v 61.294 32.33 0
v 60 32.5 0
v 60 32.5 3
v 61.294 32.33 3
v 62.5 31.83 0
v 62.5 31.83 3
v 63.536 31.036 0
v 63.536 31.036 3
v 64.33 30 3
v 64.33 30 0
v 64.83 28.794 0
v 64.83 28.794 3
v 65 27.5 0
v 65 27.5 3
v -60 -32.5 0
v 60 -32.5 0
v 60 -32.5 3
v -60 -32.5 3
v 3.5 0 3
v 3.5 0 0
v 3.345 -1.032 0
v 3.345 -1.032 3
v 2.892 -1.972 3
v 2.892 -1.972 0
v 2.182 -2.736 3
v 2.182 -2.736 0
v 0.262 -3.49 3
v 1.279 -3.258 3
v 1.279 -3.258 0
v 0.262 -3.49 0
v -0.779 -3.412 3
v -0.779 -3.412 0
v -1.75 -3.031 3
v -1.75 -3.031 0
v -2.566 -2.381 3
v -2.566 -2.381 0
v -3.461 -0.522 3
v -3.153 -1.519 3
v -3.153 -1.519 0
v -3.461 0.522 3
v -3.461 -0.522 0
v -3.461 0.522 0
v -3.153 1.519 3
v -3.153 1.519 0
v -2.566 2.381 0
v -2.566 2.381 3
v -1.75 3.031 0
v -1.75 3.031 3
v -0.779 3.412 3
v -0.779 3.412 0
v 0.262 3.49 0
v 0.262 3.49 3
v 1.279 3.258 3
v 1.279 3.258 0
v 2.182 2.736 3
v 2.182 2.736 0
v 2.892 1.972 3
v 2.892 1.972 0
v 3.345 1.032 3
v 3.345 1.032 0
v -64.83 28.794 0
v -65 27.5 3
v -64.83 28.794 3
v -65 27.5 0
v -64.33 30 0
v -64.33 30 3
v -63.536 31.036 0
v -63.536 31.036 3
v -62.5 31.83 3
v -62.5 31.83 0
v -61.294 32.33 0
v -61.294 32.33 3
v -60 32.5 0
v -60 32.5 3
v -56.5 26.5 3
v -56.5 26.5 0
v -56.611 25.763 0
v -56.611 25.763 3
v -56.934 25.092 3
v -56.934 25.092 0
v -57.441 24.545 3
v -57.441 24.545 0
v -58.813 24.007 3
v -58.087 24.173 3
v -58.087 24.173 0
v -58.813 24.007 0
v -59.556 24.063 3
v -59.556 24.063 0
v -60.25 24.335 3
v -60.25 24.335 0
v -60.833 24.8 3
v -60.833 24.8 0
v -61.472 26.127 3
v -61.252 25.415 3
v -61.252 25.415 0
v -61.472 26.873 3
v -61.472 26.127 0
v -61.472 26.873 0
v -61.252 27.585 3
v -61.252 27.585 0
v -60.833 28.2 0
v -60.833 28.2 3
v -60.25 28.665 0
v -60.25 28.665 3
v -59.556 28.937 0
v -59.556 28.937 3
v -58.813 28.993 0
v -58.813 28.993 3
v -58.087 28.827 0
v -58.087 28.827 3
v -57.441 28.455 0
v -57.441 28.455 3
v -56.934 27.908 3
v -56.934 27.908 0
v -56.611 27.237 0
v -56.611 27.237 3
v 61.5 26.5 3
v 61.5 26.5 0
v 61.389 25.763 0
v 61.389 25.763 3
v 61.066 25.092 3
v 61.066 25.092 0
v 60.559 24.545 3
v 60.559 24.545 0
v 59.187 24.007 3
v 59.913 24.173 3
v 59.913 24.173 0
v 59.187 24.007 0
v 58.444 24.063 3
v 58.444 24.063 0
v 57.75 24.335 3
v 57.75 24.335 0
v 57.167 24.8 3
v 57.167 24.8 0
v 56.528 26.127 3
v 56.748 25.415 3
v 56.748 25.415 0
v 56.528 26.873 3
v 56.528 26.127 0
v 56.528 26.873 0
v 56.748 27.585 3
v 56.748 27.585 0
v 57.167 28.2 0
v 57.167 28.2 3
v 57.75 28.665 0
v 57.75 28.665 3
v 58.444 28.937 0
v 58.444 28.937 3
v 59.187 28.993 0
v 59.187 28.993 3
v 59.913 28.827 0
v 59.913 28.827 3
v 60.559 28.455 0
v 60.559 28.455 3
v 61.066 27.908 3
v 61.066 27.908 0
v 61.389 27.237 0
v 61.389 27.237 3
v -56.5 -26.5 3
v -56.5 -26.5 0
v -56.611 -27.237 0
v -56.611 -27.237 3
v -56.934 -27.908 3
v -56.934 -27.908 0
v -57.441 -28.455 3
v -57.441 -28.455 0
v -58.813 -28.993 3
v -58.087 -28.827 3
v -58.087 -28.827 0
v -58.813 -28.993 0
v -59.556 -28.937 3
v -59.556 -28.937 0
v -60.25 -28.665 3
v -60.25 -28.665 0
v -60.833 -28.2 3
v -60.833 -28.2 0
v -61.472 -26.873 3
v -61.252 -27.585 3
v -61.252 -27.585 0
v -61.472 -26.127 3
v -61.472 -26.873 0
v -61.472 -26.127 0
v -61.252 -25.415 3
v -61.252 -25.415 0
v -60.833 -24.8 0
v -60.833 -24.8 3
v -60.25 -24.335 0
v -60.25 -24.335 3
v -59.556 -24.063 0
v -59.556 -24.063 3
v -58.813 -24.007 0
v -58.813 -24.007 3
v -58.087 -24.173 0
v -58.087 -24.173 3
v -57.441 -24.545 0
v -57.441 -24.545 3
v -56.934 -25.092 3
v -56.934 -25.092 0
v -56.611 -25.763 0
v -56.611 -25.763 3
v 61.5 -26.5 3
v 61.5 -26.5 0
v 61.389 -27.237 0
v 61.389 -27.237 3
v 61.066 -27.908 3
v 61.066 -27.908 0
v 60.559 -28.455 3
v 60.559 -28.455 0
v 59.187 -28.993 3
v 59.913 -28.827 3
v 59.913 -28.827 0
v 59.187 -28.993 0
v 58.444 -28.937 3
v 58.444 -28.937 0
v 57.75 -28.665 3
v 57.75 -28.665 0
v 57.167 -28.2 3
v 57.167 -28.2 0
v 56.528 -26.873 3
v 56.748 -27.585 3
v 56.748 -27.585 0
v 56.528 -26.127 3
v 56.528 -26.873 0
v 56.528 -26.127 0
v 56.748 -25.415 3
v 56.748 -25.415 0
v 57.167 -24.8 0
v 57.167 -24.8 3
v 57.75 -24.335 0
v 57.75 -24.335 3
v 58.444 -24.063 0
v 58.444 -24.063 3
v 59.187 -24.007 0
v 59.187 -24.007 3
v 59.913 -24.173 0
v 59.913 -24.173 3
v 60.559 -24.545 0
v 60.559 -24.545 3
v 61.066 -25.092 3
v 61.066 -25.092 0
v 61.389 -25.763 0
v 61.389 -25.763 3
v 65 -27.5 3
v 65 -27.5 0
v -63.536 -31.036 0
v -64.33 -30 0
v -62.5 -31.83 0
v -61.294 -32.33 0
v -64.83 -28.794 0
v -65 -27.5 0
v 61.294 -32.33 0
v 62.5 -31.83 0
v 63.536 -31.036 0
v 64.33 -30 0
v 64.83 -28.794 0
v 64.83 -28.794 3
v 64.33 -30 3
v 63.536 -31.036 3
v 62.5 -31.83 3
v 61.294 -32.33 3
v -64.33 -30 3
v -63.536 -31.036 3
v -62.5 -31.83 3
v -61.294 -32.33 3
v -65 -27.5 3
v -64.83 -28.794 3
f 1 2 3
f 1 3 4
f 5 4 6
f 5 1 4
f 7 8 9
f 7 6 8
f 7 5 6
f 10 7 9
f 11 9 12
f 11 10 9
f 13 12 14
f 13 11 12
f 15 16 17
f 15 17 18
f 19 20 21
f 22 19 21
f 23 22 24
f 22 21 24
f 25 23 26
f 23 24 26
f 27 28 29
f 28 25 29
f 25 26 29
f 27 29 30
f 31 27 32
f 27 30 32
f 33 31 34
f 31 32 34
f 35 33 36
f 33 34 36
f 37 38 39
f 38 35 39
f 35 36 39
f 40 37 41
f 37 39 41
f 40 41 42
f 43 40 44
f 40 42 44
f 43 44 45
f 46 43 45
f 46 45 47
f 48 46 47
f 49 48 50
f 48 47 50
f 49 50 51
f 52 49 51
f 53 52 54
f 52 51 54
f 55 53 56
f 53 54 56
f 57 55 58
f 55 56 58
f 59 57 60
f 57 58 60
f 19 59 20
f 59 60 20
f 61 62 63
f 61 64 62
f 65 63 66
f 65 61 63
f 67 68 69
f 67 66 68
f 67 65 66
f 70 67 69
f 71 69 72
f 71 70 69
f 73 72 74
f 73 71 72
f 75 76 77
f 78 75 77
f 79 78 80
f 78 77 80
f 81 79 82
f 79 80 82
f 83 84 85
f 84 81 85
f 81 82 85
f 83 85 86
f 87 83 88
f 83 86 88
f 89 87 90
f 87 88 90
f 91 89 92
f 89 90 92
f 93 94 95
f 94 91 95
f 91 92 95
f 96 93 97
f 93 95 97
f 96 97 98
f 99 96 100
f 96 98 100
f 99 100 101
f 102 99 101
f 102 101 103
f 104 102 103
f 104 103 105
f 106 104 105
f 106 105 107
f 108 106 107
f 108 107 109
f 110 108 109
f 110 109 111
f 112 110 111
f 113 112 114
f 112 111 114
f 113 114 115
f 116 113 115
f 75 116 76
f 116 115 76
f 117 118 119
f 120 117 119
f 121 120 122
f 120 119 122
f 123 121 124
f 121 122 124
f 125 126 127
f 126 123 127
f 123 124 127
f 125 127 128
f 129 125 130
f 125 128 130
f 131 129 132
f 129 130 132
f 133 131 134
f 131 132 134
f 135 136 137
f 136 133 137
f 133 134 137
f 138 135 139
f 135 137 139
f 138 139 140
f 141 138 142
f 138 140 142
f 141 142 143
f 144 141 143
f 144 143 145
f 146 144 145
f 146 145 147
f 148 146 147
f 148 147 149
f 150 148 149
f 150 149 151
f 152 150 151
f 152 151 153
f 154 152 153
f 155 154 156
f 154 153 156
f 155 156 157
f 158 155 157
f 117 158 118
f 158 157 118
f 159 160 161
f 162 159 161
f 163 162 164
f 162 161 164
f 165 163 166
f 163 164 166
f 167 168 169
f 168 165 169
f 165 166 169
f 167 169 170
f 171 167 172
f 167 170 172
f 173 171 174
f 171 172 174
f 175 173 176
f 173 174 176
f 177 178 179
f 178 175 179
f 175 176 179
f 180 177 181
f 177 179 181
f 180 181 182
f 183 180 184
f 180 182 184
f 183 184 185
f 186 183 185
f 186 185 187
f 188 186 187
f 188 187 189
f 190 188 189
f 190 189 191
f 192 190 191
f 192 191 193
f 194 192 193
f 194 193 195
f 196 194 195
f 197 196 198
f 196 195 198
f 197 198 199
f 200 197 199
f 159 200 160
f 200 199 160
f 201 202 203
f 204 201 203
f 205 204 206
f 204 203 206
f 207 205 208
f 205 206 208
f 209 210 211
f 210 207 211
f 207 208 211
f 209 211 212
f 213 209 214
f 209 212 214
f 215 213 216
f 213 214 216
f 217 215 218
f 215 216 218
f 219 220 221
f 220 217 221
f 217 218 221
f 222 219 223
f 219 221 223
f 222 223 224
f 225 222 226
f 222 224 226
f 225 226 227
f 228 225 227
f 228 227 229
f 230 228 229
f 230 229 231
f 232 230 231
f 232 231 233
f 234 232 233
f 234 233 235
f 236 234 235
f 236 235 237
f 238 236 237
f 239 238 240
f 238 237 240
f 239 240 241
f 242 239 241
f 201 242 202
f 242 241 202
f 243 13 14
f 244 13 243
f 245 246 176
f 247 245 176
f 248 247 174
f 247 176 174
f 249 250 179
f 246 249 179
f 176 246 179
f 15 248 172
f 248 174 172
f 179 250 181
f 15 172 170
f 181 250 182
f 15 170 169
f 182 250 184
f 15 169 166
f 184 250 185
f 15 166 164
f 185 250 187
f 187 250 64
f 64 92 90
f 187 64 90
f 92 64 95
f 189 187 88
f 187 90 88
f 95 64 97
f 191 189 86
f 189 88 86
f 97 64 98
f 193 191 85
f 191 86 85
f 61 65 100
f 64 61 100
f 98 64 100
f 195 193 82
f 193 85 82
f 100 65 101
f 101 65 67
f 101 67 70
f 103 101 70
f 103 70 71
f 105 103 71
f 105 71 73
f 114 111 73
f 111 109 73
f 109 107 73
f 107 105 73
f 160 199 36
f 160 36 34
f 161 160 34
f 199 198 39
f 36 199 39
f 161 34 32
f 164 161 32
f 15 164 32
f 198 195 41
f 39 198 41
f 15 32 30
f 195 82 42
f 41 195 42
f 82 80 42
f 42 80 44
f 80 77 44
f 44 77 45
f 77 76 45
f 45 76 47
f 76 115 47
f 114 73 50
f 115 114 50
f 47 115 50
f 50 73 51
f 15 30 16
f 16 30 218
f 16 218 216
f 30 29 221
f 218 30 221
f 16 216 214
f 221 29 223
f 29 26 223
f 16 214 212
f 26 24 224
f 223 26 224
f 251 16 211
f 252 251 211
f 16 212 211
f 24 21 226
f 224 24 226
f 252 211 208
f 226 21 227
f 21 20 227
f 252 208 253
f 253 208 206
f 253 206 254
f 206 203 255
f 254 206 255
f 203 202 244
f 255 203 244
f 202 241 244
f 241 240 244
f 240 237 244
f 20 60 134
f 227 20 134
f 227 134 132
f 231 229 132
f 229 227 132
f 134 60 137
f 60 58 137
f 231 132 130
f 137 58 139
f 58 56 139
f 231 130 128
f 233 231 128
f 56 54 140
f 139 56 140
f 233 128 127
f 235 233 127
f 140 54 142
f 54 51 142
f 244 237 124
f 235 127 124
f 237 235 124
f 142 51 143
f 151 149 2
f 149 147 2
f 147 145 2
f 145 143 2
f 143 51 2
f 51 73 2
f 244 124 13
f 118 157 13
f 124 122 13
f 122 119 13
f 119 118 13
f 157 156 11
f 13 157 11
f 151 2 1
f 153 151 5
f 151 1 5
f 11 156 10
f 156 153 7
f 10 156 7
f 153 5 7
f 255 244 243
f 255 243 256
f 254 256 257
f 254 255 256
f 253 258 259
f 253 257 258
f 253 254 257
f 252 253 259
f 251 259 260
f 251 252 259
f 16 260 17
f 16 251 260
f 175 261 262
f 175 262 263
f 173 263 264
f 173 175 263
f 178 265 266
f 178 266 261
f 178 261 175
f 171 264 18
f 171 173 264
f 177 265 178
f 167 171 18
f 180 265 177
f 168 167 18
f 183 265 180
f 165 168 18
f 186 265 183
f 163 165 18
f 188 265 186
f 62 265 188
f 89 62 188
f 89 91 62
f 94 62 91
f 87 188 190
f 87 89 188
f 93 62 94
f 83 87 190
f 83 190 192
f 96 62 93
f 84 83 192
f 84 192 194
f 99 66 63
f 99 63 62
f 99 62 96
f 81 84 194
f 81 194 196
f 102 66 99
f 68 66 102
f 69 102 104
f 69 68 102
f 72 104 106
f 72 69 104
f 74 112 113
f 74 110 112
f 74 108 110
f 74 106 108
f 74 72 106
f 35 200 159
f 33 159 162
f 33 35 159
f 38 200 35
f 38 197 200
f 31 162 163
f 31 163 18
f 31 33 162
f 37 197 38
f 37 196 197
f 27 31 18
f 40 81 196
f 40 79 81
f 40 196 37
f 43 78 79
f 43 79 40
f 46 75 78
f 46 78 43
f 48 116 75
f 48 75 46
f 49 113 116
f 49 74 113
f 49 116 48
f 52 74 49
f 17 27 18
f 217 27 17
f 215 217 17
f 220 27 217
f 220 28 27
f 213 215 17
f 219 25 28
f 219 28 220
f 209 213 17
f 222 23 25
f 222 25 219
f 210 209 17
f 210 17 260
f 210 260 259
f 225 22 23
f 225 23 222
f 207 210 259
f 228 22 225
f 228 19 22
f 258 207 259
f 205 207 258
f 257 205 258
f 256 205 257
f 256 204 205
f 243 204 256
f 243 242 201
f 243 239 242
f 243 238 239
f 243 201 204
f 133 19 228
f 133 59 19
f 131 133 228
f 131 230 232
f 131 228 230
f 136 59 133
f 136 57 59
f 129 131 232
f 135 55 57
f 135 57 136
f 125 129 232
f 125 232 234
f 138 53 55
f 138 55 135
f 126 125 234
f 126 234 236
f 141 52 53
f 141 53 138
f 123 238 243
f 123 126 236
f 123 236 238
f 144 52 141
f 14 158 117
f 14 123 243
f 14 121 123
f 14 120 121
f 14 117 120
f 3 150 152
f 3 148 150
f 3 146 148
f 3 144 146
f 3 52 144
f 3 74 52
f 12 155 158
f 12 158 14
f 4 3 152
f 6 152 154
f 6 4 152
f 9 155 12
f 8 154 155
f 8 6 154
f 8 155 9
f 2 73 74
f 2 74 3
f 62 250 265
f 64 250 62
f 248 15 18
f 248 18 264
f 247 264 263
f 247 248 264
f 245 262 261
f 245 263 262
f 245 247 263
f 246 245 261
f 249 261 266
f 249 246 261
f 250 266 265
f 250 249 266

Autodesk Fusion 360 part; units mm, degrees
sketch "Sketch1" plane through (0, 0, 0) normal (0, 0, 1) x (1, 0, 0)
  line L0 (-60, 32.5) -> (60, 32.5)
  line L1 (65, 27.5) -> (65, -27.5)
  line L2 (60, -32.5) -> (-60, -32.5)
  line L3 (-65, -27.5) -> (-65, 27.5)
  arc A0 (-60, 32.5) -> (-65, 27.5) centre (-60, 27.5) ccw
  arc A1 (-65, -27.5) -> (-60, -32.5) centre (-60, -27.5) ccw
  arc A2 (65, 27.5) -> (60, 32.5) centre (60, 27.5) ccw
  arc A3 (60, -32.5) -> (65, -27.5) centre (60, -27.5) ccw
  circle A4 centre (-59, 26.5) radius 2.5
  circle A5 centre (-59, -26.5) radius 2.5
  circle A6 centre (59, 26.5) radius 2.5
  circle A7 centre (59, -26.5) radius 2.5
  circle A8 centre (0, 0) radius 3.5
  dimension "d1" = 65
  dimension "d2" = 65
  dimension "d3" = 32.5
  dimension "d4" = 32.5
  dimension "d5" = 5
  dimension "d6" = 5
  dimension "d7" = 5
  dimension "d8" = 5
  dimension "d9" = 5
  dimension "d10" = 6
  dimension "d11" = 6
  dimension "d12" = 5
  dimension "d13" = 6
  dimension "d14" = 6
  dimension "d15" = 5
  dimension "d16" = 6
  dimension "d17" = 6
  dimension "d18" = 5
  dimension "d19" = 6
  dimension "d20" = 6
  dimension "d21" = 7
extrude "Extrude1" add sketch "Sketch1" along normal blind 3
equation "d2 = d1"
equation "d3 = ( 65 / 2 ) * 1 mm"
equation "d4 = d3"
equation "d6 = d5"
equation "d7 = d5"
equation "d8 = d5"
equation "d11 = d10"
equation "d12 = d9"
equation "d13 = d10"
equation "d14 = d10"
equation "d15 = d9"
equation "d16 = d10"
equation "d17 = d10"
equation "d18 = d9"
equation "d19 = d10"
equation "d20 = d10"
